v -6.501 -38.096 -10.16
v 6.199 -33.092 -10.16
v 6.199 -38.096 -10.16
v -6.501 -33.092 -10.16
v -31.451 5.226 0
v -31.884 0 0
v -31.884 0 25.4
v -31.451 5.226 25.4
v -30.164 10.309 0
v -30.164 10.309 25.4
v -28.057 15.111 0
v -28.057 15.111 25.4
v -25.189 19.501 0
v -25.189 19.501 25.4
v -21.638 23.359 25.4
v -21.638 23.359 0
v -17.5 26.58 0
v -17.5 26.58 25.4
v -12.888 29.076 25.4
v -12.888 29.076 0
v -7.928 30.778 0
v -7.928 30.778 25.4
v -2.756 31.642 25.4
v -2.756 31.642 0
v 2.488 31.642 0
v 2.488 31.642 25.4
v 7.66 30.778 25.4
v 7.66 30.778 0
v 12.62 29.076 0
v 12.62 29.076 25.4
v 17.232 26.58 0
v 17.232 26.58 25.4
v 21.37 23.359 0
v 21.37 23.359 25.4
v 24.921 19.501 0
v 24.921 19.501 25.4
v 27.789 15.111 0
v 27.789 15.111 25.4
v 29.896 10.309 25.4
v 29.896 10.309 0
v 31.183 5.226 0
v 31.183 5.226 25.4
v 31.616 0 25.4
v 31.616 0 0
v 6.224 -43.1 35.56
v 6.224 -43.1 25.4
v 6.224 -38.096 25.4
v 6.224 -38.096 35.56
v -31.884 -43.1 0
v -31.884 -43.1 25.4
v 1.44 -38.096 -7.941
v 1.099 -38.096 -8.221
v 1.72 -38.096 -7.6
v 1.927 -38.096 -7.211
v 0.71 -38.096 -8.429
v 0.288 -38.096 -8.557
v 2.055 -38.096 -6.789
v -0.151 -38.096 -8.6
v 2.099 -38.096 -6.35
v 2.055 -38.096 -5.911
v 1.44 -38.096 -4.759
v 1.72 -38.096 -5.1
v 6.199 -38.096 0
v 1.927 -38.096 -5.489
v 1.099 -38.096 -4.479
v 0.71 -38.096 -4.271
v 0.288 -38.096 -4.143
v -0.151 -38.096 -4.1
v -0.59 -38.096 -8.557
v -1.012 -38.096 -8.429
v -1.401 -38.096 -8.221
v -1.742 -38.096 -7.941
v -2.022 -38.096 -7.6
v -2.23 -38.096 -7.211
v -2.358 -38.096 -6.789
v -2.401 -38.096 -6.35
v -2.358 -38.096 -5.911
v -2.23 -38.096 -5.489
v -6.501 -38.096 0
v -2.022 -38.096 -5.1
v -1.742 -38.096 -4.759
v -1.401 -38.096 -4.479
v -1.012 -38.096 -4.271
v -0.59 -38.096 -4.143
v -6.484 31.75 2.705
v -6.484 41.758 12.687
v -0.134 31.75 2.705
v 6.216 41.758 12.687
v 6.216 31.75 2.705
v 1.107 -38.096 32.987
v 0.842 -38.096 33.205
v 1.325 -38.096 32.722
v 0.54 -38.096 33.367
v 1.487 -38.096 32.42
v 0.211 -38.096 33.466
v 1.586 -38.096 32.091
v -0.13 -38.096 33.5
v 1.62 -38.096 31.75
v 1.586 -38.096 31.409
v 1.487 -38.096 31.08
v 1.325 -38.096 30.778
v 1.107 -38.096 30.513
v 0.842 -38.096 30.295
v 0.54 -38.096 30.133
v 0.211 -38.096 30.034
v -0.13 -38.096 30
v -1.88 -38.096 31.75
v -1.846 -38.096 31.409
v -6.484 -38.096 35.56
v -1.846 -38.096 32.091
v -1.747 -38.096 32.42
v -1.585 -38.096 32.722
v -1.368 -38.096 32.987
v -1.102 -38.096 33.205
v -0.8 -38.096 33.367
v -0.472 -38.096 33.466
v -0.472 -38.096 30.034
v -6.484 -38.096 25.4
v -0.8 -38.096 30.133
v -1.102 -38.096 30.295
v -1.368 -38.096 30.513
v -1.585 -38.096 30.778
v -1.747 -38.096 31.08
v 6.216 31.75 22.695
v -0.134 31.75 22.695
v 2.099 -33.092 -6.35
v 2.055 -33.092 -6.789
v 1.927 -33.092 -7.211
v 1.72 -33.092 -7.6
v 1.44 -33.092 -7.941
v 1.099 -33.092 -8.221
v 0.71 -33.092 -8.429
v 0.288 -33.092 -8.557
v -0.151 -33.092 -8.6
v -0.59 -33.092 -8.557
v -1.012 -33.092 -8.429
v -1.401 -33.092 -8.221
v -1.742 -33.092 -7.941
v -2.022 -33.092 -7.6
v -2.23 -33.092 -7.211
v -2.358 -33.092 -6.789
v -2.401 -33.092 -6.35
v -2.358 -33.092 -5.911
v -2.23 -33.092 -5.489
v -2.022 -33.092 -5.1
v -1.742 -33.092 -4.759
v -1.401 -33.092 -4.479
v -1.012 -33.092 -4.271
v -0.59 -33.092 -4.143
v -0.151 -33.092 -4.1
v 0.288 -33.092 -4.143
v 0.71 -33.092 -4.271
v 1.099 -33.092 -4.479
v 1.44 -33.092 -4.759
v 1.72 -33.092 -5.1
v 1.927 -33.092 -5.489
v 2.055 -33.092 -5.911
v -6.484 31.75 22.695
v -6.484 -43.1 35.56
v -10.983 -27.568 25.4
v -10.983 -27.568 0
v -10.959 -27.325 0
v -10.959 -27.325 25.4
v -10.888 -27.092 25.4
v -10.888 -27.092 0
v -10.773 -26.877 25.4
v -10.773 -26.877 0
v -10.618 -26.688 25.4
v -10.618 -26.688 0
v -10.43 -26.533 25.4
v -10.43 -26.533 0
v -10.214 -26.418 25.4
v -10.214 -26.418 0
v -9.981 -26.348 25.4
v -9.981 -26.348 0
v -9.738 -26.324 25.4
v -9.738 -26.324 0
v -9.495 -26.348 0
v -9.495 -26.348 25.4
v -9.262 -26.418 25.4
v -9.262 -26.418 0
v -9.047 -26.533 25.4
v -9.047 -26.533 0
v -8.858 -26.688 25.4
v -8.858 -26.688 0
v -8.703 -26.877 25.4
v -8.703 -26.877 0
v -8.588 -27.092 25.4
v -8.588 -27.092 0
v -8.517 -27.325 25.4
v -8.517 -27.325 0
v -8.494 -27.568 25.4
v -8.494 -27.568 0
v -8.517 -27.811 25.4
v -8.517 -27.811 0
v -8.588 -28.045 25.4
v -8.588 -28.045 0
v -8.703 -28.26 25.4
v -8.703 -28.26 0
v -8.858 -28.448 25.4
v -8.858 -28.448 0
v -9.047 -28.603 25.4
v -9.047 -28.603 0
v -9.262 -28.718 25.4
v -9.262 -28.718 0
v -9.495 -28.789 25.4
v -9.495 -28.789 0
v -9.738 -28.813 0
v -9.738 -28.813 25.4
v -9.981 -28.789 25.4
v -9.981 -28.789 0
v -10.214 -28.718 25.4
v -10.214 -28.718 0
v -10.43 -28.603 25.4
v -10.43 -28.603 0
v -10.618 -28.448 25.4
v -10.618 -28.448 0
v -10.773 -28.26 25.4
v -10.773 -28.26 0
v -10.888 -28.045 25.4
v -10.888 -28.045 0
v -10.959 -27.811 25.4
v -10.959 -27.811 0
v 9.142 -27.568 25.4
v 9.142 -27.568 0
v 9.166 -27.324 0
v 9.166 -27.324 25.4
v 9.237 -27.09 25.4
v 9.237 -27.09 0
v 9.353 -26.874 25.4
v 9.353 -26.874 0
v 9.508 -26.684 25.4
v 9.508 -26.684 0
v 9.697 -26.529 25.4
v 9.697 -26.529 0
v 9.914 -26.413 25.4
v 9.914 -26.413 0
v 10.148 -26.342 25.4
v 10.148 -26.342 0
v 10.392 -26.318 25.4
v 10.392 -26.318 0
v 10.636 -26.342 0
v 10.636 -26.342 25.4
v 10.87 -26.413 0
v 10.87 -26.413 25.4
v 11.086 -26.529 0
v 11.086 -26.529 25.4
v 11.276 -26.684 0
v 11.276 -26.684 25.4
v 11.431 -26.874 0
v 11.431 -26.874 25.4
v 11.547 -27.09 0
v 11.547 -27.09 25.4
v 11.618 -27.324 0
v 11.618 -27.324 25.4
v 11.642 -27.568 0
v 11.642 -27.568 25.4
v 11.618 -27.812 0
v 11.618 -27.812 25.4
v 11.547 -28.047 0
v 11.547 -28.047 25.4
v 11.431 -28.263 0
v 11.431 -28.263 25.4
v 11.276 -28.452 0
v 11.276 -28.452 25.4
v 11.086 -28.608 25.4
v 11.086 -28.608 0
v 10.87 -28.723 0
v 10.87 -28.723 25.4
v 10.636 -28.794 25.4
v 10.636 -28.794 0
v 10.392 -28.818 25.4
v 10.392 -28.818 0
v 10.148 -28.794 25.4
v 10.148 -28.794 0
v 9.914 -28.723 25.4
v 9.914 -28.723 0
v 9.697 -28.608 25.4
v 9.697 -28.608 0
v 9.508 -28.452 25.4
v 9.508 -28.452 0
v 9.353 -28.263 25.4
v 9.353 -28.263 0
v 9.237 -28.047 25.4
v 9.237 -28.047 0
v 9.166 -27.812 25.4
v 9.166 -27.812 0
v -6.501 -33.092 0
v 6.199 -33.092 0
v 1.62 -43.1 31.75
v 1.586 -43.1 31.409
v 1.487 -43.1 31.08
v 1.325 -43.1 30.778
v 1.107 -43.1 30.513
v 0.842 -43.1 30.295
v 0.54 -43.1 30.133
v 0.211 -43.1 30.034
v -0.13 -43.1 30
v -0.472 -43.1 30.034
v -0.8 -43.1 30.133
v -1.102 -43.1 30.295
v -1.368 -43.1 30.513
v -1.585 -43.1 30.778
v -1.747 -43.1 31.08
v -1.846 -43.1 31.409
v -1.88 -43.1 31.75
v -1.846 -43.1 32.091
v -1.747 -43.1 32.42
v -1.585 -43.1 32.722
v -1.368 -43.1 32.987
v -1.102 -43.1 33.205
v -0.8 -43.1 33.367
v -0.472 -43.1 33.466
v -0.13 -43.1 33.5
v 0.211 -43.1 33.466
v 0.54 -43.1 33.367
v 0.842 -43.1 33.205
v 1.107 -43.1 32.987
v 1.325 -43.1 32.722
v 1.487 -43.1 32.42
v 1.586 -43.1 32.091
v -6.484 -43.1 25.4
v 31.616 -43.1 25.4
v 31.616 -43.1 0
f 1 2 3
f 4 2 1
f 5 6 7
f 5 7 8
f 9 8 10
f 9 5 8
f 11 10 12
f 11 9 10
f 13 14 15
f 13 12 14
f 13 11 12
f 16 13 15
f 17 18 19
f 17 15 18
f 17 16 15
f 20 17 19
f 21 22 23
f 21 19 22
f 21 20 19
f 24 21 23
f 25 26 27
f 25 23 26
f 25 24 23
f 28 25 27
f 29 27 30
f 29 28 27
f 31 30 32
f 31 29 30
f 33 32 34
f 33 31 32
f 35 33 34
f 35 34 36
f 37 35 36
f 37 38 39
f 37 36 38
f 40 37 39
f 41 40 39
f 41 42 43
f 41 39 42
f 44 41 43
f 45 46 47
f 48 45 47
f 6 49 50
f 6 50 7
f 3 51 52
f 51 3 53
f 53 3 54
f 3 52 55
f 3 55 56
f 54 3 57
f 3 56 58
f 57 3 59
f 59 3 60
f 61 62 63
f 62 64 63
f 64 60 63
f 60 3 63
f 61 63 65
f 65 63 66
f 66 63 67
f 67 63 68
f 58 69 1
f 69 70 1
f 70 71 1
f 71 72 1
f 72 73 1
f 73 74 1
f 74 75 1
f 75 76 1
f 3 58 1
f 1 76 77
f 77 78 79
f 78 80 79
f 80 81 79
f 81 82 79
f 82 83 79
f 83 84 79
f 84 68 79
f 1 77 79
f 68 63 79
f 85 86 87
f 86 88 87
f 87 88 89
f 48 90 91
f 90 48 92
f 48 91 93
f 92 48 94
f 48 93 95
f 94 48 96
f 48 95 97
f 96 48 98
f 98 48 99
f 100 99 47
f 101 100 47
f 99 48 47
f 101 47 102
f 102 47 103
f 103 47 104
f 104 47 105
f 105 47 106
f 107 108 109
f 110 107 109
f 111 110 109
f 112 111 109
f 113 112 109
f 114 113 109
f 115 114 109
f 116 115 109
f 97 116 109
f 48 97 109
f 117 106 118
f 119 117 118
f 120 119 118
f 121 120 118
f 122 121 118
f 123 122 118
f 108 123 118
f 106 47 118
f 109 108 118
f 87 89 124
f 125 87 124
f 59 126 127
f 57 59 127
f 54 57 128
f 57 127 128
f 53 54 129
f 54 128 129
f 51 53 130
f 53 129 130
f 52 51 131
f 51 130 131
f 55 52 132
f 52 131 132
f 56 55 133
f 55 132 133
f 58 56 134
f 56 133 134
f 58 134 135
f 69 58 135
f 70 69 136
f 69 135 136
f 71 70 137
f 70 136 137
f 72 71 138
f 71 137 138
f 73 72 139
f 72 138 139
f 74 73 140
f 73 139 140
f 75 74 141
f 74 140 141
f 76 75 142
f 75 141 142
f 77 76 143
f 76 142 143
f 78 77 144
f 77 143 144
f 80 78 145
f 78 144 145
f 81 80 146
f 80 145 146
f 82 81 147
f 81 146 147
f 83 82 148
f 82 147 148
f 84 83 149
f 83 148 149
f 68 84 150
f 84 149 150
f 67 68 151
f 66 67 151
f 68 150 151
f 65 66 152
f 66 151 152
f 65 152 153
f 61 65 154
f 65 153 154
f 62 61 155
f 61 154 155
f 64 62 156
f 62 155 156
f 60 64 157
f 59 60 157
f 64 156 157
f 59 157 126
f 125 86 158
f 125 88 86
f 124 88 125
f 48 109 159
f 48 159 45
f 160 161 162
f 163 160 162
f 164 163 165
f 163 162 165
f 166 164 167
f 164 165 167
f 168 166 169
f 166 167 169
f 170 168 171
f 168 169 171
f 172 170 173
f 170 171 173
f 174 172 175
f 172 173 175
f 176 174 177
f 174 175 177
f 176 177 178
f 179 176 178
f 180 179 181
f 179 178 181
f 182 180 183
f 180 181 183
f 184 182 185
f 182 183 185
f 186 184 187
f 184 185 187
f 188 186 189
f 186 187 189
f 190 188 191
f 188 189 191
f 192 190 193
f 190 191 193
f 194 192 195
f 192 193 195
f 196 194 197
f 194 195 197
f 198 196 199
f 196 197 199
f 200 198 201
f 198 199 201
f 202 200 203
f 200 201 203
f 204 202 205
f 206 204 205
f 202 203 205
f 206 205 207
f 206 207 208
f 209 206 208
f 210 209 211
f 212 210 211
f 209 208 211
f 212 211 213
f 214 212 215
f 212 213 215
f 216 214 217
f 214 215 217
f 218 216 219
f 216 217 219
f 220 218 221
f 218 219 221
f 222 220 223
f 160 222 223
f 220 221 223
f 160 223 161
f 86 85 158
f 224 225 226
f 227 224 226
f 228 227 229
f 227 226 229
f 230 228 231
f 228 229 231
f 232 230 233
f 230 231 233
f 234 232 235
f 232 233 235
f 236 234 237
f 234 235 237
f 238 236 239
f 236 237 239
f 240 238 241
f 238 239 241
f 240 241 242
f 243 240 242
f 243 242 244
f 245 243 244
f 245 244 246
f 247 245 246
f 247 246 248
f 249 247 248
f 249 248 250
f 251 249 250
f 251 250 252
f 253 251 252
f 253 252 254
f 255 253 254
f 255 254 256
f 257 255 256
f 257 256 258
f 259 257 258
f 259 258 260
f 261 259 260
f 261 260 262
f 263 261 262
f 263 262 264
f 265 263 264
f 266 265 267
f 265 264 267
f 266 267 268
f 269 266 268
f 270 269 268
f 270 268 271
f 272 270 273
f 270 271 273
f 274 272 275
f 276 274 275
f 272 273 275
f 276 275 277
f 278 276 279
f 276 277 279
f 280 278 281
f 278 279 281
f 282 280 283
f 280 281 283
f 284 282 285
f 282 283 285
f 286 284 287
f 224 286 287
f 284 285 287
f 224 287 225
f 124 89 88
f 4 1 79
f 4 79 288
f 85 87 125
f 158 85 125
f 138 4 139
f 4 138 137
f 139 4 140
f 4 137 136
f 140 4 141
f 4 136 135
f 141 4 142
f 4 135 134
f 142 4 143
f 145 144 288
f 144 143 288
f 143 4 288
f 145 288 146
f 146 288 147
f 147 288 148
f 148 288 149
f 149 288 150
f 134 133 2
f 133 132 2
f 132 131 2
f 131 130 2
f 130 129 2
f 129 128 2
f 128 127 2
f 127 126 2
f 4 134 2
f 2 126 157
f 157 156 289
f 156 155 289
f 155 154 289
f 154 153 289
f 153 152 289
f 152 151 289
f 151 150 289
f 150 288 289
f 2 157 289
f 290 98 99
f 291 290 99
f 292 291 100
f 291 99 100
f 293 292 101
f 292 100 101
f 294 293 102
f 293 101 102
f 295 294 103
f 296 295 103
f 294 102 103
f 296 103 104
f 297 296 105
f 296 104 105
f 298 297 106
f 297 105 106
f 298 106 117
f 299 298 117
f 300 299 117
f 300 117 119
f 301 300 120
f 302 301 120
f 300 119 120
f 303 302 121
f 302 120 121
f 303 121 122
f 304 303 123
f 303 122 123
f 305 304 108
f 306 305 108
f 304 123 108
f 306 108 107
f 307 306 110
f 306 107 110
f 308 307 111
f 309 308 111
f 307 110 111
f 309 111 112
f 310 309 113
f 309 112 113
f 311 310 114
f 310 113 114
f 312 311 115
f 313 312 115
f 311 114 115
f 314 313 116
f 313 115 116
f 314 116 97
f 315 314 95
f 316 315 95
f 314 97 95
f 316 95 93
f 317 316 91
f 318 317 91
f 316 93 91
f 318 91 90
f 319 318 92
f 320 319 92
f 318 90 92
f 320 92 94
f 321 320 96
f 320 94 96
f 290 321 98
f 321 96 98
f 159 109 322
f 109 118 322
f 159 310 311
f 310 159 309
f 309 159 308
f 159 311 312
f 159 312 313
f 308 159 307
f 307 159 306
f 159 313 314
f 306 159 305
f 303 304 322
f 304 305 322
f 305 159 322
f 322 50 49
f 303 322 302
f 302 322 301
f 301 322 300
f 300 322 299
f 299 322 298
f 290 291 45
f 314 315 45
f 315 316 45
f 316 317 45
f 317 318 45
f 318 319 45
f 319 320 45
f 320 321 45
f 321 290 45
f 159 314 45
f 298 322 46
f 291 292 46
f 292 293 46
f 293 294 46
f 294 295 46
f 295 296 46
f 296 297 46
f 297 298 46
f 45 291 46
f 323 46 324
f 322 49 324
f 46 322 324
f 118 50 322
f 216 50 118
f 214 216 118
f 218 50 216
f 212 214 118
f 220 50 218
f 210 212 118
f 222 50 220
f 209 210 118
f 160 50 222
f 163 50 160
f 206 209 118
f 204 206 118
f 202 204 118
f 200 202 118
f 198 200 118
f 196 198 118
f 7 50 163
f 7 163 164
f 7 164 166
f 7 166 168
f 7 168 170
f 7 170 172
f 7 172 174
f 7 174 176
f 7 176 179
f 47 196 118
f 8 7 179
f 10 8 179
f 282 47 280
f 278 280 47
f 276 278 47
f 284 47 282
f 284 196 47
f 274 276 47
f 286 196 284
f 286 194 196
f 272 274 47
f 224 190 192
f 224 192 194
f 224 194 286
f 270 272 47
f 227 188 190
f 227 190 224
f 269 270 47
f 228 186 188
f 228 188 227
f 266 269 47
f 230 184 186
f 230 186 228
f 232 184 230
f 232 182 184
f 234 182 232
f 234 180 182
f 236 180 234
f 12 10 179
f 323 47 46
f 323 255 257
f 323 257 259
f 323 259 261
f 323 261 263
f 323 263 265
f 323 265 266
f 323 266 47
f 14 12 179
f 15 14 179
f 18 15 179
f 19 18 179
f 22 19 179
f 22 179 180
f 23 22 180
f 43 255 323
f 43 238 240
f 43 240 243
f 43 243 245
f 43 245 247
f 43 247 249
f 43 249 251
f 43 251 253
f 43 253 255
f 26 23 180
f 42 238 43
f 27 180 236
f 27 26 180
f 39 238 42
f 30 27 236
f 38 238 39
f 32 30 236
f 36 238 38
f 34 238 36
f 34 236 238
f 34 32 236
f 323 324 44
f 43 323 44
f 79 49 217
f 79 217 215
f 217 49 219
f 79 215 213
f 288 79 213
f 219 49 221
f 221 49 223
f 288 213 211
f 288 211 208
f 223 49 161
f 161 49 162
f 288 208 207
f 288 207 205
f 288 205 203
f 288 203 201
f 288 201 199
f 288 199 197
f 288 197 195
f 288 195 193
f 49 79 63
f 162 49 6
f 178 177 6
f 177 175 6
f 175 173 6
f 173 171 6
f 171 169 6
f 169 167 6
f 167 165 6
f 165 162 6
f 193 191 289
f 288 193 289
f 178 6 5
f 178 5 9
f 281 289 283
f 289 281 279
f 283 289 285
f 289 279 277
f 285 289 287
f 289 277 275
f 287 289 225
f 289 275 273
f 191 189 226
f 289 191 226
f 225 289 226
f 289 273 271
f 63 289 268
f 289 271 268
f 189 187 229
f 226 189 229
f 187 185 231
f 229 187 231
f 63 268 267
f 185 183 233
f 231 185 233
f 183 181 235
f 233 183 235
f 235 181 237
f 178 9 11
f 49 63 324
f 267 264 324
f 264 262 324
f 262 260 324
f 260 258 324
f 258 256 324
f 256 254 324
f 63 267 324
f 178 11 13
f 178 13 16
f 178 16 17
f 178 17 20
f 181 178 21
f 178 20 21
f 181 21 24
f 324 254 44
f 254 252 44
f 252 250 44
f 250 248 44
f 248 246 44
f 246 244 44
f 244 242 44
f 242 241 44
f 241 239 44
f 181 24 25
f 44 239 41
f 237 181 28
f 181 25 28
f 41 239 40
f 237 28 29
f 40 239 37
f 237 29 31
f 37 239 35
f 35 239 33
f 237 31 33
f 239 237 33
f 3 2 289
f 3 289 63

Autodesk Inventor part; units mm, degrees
ref_plane "YZ Plane" through (0, 0, 0) normal (1, 0, 0) x (0, 1, 0)
ref_plane "XZ Plane" through (0, 0, 0) normal (0, 1, 0) x (-1, 0, 0)
sketch "Sketch1" plane through (0, 0, 0) normal (0, 0, 1) x (1, 0, 0)
  line L0 (6.1806, -38.0962) -> (6.1806, -43.1) projected
  line L1 (6.1806, -43.1) -> (32.8861, -43.1) projected
  line L2 (32.8861, -43.1) -> (32.8861, 0) projected
  arc A0 (32.8861, 0) -> (-33.1539, 0) centre (-0.1339, 0) ccw projected
  line L3 (-33.1539, 0) -> (-33.1539, -43.1) projected
  line L4 (-33.1539, -43.1) -> (-6.4839, -43.1) projected
  line L5 (-6.4839, -43.1) -> (-6.4839, -38.0962) projected
  line L6 (-6.4839, -38.0962) -> (6.1806, -38.0962) projected
  circle A1 centre (-0.1339, 0) radius 31.75
  line L7 (-31.8839, 0) -> (18.9313, 0)
  line L8 (22.7413, -43.1) -> (-31.8839, -43.1)
  line L9 (-31.8839, -43.1) -> (-31.8839, 0)
  line L10 (31.6161, 0) -> (-31.8839, 0)
  line L11 (-31.8839, 0) -> (-31.8839, -43.1)
  line L12 (-31.8839, -43.1) -> (31.6161, -43.1)
  line L13 (31.6161, -43.1) -> (31.6161, 0)
  point P0 (0, 0)
  dimension "d0" = 63.5
extrude "Extrusion1" add sketch "Sketch1" along normal blind 25.4 contours L6 L5 L4 L9 A1 L13 L1 L0 | L0 L8 L5 L6 | L10 L7 A1 | A1 L7 L10
sketch "Sketch2" plane through (0, 0, 0) normal (0, 0, -1) x (-1, 0, 0)
  line L0 (6.4974, -43.1) -> (-6.1987, -43.1) projected
  line L1 (-6.1987, -43.1) -> (-6.1987, -38.0962) projected
  line L2 (-6.1987, -38.0962) -> (6.4974, -38.0962) projected
  line L3 (6.4974, -38.0962) -> (6.4974, -43.1) projected
  line L4 (-6.1987, -38.0962) -> (6.5013, -38.0962)
  line L5 (6.5013, -38.0962) -> (6.5013, -33.0924)
  line L6 (6.5013, -33.0924) -> (-6.1987, -33.0924)
  line L7 (-6.1987, -33.0924) -> (-6.1987, -38.0962)
  point P0 (0, 0)
  dimension "d9" = 5.0038
  dimension "d25" = 12.7
extrude "Extrusion4" add sketch "Sketch2" along normal blind 10.16 contours L2 L7 L6 L5 L4
sketch "Sketch4" plane through (-6.5013, -33.0924, 0) normal (0, 1, 0) x (1, 0, 0)
  line L0 (12.7, 10.16) -> (0, 10.16) projected
  line L1 (6.35, 10.16) -> (6.35, 6.35)
  circle A0 centre (6.35, 6.35) radius 2.25
  point P0 (6.5013, 0)
  dimension "d12" = 3.81
  dimension "d13" = 4.5
extrude "Extrusion5" cut sketch "Sketch4" against normal blind 10.16
sketch "Sketch5" plane through (0, 0, 25.4) normal (0, 0, 1) x (1, 0, 0)
  line L0 (-4.5713, -43.1) -> (1.7787, -43.1)
  line L1 (1.7787, -43.1) -> (-10.9213, -43.1)
  line L2 (-10.9213, -43.1) -> (6.2237, -43.1)
  line L3 (6.2237, -43.1) -> (6.2237, -38.0962)
  line L4 (6.2237, -38.0962) -> (-10.9213, -38.0962)
  line L5 (-0.1339, -43.1) -> (6.2161, -43.1)
  line L6 (6.2161, -43.1) -> (-6.4839, -43.1)
  line L7 (-6.4839, -43.1) -> (6.2237, -43.1)
  line L8 (6.2237, -43.1) -> (6.2237, -38.0962)
  line L9 (6.2237, -38.0962) -> (-6.4839, -38.0962)
  line L10 (-6.4839, -38.0962) -> (-6.4839, -43.1)
  point P0 (0, 0)
  dimension "d16" = 6.35
  dimension "d17" = 12.7
  dimension "d18" = 5.0038
  dimension "d26" = 6.35
  dimension "d27" = 12.7
  dimension "d28" = 5.0038
extrude "Extrusion6" add sketch "Sketch5" along normal blind 10.16
sketch "Sketch7" plane through (-6.4839, -38.0962, 25.4) normal (0, 1, 0) x (1, 0, 0)
  line L0 (12.7076, -10.16) -> (0, -10.16) projected
  line L1 (6.3538, -10.16) -> (6.3538, -6.35)
  circle A0 centre (6.3538, -6.35) radius 1.75
  point P0 (6.4839, 25.4)
  dimension "d29" = 3.81
  dimension "d30" = 3.5
extrude "Extrusion8" cut sketch "Sketch7" against normal blind 10.16
ref_plane "Work Plane1" through (-0.1339, -43.1, 0) normal (-1, 0, 0) x (0, 0, 1)
sketch "Sketch8" plane through (-0.1339, -43.1, 0) normal (-1, 0, 0) x (0, 0, 1)
  line L0 (0, 74.85) -> (0, 43.1) projected
  line L1 (0, 74.85) -> (2.7051, 74.85)
  line L2 (0, 74.85) -> (25.4, 74.85) projected
  line L3 (2.7051, 74.85) -> (22.6949, 74.85)
  line L4 (22.6949, 74.85) -> (12.6873, 74.85)
  line L5 (12.6873, 74.85) -> (12.6873, 84.8576)
  line L6 (12.6873, 84.8576) -> (22.6949, 74.85)
  line L7 (12.6873, 84.8576) -> (2.7051, 74.85)
  dimension "d34" = 2.7051
  dimension "d35" = 19.9898
  dimension "d36" = 10.0076
  dimension "d37" = 10.0076
extrude "Extrusion9" add sketch "Sketch8" along normal mid plane 12.7
sketch "Sketch9" plane through (0, 0, 0) normal (0, 0, -1) x (-1, 0, 0)
  ellipse E0 centre (-12.3919, -27.5683) end of major axis (-12.3919, -26.3183) minor radius 1.25 projected
  ellipse E1 centre (11.7381, -27.5683) end of major axis (11.7381, -26.3183) minor radius 1.25 projected
  line L0 (-12.3919, -27.5683) -> (-10.3919, -27.5683)
  line L1 (11.7381, -27.5683) -> (9.7381, -27.5683)
  circle A0 centre (-10.3919, -27.5683) radius 1.25
  circle A1 centre (-10.3919, -27.5683) radius 1.25
  circle A2 centre (9.7381, -27.5683) radius 1.2446
  point P0 (0, 0)
  dimension "d40" = 2
  dimension "d41" = 2
  dimension "d44" = 2.4892
extrude "Extrusion10" cut sketch "Sketch9" against normal blind 25.4 contours A0 L0 E0 | E0 A0 | E0 L0 A0 | A2 L1 E1 | E1 A2 | E1 L1 A2 picked at (-9.8215, -27.4653) picked at (9.1713, -27.6709)
properties part number "Tail3"
